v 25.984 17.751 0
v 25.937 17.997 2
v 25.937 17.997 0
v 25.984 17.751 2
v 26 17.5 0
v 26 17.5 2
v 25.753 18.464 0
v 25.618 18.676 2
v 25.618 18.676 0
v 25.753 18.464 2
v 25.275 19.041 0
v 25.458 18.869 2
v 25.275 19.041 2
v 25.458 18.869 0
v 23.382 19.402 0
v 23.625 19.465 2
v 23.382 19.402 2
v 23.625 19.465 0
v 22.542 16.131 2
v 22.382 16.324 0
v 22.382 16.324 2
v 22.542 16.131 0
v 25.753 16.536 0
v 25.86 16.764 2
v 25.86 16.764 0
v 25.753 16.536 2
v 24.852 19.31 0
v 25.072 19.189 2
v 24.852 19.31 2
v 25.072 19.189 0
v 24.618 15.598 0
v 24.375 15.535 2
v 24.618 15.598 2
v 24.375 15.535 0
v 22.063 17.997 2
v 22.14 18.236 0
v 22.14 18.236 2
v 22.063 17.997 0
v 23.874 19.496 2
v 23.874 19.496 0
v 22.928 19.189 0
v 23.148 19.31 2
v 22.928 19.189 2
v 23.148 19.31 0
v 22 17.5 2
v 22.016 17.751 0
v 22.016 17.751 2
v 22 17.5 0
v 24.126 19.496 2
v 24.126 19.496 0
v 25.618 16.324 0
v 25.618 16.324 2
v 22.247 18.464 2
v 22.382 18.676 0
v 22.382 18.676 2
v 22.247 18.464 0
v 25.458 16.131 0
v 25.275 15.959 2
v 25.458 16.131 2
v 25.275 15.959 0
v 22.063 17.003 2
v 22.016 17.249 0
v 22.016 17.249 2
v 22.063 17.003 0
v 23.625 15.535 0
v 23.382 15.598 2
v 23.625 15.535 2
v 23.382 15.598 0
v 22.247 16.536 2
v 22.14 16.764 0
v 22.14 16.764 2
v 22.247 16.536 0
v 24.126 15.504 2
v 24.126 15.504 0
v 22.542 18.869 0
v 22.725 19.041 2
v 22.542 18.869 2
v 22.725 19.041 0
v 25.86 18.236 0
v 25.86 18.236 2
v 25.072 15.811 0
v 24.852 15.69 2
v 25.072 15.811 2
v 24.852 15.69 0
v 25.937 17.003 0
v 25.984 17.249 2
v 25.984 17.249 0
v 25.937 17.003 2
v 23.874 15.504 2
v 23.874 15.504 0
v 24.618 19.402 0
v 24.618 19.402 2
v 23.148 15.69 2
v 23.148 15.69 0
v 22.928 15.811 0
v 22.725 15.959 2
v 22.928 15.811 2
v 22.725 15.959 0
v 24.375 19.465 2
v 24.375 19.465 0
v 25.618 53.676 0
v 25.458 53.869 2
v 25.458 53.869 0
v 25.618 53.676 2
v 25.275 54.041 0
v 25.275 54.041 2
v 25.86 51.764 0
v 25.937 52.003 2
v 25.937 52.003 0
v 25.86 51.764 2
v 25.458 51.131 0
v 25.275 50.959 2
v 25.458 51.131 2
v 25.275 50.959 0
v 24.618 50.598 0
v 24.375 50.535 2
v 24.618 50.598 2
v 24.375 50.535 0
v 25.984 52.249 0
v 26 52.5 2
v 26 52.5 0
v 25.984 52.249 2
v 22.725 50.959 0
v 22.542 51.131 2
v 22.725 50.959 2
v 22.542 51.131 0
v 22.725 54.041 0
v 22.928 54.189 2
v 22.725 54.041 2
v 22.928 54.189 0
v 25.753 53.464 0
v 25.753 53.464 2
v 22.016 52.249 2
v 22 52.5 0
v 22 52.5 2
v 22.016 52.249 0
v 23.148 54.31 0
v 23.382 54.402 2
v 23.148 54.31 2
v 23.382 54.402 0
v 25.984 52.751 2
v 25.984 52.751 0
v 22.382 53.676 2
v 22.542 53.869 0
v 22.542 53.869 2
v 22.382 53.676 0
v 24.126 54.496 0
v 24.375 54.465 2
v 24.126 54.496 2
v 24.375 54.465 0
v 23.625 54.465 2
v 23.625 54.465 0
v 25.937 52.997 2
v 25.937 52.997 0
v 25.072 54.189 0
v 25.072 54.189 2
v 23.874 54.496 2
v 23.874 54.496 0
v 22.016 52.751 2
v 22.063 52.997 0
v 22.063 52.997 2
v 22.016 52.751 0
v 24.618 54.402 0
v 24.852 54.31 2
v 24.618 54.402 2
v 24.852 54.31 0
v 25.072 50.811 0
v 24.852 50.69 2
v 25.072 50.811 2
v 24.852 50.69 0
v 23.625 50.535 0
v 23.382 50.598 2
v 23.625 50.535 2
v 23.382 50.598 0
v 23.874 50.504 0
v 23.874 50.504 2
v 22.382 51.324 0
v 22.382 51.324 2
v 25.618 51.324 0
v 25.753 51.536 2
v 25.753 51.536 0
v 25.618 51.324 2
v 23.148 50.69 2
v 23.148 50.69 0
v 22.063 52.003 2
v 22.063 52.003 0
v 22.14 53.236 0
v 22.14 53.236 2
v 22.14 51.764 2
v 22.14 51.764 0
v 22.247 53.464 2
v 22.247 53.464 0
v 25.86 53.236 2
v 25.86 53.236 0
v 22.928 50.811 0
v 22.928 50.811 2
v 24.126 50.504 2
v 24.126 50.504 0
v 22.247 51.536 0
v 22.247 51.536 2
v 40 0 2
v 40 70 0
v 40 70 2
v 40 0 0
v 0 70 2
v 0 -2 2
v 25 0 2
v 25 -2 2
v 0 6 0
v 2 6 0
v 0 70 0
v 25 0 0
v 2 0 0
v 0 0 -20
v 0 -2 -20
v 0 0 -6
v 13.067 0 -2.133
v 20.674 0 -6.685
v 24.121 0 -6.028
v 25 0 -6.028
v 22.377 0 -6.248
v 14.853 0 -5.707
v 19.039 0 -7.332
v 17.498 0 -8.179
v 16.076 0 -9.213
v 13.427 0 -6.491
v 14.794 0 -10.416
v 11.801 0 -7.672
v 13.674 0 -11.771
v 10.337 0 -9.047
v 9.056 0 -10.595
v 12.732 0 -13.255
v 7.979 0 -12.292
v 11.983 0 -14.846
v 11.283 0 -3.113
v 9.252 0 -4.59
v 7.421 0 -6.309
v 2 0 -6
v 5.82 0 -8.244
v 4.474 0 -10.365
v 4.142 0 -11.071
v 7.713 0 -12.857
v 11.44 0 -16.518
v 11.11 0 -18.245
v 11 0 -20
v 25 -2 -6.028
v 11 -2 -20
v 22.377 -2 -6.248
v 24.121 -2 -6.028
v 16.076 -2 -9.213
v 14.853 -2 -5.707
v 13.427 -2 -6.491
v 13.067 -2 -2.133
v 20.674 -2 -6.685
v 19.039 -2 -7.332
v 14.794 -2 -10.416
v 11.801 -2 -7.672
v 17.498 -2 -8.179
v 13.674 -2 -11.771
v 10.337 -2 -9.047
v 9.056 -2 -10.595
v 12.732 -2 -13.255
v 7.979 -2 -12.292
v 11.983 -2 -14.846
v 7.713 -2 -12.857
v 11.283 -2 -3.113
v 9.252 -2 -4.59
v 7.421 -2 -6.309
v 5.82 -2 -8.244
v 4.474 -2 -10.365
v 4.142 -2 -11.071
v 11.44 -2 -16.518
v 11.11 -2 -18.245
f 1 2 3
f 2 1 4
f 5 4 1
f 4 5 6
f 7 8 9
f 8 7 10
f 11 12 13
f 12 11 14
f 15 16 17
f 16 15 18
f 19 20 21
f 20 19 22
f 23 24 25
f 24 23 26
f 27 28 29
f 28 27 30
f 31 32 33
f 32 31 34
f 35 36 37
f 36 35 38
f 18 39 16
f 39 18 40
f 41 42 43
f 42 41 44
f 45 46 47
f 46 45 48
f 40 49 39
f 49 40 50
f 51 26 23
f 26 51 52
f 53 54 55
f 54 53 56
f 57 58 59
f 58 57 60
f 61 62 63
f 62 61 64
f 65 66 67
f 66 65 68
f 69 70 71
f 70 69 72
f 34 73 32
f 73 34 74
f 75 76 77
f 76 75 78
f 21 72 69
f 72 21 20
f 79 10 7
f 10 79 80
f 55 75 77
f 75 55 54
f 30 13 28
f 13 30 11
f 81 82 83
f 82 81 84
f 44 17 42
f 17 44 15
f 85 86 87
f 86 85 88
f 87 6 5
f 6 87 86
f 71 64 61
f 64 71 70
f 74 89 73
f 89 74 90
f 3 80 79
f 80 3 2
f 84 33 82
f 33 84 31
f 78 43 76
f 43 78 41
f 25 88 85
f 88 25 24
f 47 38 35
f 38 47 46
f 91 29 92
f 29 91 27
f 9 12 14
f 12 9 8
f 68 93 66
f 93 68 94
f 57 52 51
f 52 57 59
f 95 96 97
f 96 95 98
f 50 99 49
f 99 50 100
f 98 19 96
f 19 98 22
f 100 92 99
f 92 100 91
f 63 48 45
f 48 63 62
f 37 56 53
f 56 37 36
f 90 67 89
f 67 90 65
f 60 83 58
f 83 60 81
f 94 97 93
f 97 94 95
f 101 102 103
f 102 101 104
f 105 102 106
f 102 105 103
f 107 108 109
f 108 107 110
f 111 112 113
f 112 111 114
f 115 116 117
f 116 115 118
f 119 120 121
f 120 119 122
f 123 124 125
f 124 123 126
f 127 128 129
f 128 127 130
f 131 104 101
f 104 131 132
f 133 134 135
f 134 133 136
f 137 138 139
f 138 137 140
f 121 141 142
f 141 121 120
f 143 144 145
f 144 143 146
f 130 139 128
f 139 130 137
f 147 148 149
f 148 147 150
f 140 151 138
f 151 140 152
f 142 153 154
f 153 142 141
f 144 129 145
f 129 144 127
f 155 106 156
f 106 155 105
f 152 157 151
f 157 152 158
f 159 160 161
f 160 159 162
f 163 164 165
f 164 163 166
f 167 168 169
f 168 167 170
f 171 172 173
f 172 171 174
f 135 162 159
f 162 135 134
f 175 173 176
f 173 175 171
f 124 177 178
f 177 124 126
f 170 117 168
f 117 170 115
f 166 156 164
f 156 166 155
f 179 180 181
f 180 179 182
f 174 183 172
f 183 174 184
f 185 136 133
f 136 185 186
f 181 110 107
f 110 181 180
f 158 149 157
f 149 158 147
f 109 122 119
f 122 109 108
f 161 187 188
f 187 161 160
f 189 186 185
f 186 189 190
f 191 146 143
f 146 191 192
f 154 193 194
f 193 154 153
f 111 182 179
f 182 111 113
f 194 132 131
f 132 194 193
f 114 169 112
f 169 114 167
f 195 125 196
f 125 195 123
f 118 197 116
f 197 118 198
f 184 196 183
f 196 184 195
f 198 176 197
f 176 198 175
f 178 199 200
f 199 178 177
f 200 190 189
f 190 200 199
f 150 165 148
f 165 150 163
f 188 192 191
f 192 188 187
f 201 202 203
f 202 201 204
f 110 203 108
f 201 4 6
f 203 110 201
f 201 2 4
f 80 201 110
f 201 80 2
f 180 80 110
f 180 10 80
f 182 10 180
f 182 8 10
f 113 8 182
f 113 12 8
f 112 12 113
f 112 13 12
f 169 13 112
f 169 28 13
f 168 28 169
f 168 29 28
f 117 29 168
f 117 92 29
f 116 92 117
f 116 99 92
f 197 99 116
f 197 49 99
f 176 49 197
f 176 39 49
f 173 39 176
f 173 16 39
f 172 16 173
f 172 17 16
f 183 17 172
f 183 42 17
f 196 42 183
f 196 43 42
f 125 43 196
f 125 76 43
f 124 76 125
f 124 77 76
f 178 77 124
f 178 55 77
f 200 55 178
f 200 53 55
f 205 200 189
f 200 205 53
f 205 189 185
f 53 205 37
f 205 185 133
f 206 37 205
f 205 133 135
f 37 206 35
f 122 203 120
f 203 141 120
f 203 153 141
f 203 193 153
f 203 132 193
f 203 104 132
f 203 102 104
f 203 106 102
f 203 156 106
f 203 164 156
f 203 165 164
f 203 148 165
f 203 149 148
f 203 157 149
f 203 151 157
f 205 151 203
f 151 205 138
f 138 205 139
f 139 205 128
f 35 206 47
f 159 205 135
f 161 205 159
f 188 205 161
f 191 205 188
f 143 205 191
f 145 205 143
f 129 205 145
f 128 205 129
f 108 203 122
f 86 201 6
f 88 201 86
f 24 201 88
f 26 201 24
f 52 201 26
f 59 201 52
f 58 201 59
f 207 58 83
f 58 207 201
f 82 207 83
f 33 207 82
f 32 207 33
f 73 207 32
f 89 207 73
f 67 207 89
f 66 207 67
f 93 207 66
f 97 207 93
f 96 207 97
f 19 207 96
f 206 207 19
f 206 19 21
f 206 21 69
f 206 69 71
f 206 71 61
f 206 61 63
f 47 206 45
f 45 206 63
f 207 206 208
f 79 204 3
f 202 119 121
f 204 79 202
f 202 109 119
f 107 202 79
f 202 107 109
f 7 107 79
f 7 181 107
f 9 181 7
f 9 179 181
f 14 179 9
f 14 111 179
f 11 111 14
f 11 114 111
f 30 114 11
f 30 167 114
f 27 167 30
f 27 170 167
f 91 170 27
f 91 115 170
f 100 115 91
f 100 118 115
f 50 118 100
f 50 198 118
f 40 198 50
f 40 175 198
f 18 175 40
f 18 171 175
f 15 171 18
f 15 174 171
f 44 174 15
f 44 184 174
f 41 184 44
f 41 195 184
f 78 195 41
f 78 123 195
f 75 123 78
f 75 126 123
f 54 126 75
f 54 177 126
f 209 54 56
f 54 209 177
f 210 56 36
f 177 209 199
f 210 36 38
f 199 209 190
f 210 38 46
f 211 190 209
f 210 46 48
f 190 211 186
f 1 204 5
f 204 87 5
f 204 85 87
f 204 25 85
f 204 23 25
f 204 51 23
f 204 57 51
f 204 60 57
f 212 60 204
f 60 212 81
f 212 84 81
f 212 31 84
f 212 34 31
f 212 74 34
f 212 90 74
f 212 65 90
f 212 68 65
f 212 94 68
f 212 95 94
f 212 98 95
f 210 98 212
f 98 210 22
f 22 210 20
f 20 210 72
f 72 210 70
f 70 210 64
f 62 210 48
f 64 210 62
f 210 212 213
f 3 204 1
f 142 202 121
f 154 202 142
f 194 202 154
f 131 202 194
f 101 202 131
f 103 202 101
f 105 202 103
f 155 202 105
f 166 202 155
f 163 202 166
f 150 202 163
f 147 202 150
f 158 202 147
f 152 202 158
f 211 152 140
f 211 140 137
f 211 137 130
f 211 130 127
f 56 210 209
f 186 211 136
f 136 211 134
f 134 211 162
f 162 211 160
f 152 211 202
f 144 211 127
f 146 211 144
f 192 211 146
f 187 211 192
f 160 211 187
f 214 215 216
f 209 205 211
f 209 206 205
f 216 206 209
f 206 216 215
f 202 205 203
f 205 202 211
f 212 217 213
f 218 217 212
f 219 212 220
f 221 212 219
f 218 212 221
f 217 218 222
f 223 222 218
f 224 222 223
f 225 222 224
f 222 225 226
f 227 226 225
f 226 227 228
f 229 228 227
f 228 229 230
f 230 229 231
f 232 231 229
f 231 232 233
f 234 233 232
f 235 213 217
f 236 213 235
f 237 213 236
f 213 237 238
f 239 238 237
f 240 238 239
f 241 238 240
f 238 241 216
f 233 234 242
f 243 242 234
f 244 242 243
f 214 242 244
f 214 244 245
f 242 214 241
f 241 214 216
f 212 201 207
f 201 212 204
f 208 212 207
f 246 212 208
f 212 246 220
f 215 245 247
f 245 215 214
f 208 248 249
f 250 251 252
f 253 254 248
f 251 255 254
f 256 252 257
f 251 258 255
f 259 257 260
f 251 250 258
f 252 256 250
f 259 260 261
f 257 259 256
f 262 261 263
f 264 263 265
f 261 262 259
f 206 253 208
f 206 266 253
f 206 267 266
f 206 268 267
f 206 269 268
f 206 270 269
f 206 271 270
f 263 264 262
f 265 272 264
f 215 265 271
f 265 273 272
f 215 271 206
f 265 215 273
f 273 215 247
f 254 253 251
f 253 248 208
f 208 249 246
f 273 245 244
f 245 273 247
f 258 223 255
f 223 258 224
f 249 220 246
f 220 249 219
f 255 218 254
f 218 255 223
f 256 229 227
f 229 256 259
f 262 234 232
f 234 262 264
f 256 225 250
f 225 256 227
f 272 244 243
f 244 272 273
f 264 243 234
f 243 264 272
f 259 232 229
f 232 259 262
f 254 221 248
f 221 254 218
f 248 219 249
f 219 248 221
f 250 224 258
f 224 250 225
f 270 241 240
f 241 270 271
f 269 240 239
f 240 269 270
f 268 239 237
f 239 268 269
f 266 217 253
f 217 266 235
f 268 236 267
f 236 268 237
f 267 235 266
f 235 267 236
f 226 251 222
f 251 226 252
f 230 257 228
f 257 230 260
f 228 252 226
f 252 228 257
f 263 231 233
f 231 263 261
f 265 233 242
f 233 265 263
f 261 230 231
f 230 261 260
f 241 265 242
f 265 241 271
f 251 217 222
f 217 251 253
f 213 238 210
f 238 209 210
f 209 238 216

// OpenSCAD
$fn=50;

thickness=2;
body_width=70;
body_length=40;

step_length=25;
step_width=80;

holder_width=50;
holder_inside=7;
holder_height=50;
holder_inner_width=18;
holder_inner_height=30;

tab_height=20;
tab_hole_r=14;
tab_drill_border=15;

drill_r=2;




holder_length=holder_inside + 2*thickness;
holder_base_length=holder_length + 10;
    
module body() {
    difference() {
        cube([body_length, body_width, thickness]);
        holder_drills();
    }
    
    tab();
        
    translate([thickness, 0, 0])
        rotate([0, 0, 180])
            backing();
}

module step() {
    translate([0, -step_width, 0])
        cube([step_length, step_width, thickness]);
    
    tab();
    
    translate([0, -thickness, 0])
        backing();
    translate([step_length -thickness, -thickness, 0])
        backing();
}

module holder() {
    difference() {
        translate([body_length - holder_base_length, 0, 0])
            cube([holder_base_length, body_width, thickness]);
        holder_drills();
    }

    translate([0, (body_width - holder_width)/2, 0]) {
        difference() {
            translate([body_length - holder_length, (body_width - holder_width)/2, thickness])
                cube([holder_length, holder_width, holder_height]);
            
            translate([body_length - holder_length - 1, -1, thickness])
                cube([holder_inside +  thickness + 1, body_width + 2, holder_height + 1]);
        }
        
        translate([body_length - holder_length, (body_width - holder_inner_width)/2, thickness])
            cube([thickness, holder_inner_width, holder_inner_height]);
    }
    
}

module holder_drills() {
    translate([body_length - holder_base_length + 5, body_width/4, -1]) {
        cylinder(thickness+2, r=drill_r);
        
        translate([0, body_width/2, 0])
            cylinder(thickness+2, r=drill_r);
    }
}

module tab() {
    difference() {
        translate([0, -thickness, -tab_height]) {
            difference() {
                cube([step_length, thickness, tab_height + thickness]);
                rotate([-90, 0, 0]) {
                    translate([step_length, 0, -1]) {
                        cylinder(thickness + 2, r=tab_hole_r);
                            
                    }
                }
            }
        }
        translate([thickness, 0, 0]) {
            tab_drill(tab_hole_r + 2, drill_r * 2, tab_drill_border);
        }
    }
}

module tab_drill(radius, width, foo) {
    translate([radius + width, 1, -radius -width]) {
        rotate([90, 0, 0]) {
            intersection() {
                difference() {
                    cylinder(thickness + 2, r=radius + width);
                    translate([0, 0, -1]) {cylinder(thickness + 4, r=radius);};
                }
                linear_extrude(height = thickness + 2) {
                    polygon(points=[[0,0], [-radius -width -10, foo], [-foo, radius + width + 10]]);
                }
            }
        }
    }
}

module backing() {
    backing_width=tab_height - tab_hole_r;
    rotate([-90, 0, -90])
        linear_extrude(height = thickness)
            polygon(points=[[0,0], [backing_width, 0], [0, backing_width]]);
}

body();
//step();
//holder();
